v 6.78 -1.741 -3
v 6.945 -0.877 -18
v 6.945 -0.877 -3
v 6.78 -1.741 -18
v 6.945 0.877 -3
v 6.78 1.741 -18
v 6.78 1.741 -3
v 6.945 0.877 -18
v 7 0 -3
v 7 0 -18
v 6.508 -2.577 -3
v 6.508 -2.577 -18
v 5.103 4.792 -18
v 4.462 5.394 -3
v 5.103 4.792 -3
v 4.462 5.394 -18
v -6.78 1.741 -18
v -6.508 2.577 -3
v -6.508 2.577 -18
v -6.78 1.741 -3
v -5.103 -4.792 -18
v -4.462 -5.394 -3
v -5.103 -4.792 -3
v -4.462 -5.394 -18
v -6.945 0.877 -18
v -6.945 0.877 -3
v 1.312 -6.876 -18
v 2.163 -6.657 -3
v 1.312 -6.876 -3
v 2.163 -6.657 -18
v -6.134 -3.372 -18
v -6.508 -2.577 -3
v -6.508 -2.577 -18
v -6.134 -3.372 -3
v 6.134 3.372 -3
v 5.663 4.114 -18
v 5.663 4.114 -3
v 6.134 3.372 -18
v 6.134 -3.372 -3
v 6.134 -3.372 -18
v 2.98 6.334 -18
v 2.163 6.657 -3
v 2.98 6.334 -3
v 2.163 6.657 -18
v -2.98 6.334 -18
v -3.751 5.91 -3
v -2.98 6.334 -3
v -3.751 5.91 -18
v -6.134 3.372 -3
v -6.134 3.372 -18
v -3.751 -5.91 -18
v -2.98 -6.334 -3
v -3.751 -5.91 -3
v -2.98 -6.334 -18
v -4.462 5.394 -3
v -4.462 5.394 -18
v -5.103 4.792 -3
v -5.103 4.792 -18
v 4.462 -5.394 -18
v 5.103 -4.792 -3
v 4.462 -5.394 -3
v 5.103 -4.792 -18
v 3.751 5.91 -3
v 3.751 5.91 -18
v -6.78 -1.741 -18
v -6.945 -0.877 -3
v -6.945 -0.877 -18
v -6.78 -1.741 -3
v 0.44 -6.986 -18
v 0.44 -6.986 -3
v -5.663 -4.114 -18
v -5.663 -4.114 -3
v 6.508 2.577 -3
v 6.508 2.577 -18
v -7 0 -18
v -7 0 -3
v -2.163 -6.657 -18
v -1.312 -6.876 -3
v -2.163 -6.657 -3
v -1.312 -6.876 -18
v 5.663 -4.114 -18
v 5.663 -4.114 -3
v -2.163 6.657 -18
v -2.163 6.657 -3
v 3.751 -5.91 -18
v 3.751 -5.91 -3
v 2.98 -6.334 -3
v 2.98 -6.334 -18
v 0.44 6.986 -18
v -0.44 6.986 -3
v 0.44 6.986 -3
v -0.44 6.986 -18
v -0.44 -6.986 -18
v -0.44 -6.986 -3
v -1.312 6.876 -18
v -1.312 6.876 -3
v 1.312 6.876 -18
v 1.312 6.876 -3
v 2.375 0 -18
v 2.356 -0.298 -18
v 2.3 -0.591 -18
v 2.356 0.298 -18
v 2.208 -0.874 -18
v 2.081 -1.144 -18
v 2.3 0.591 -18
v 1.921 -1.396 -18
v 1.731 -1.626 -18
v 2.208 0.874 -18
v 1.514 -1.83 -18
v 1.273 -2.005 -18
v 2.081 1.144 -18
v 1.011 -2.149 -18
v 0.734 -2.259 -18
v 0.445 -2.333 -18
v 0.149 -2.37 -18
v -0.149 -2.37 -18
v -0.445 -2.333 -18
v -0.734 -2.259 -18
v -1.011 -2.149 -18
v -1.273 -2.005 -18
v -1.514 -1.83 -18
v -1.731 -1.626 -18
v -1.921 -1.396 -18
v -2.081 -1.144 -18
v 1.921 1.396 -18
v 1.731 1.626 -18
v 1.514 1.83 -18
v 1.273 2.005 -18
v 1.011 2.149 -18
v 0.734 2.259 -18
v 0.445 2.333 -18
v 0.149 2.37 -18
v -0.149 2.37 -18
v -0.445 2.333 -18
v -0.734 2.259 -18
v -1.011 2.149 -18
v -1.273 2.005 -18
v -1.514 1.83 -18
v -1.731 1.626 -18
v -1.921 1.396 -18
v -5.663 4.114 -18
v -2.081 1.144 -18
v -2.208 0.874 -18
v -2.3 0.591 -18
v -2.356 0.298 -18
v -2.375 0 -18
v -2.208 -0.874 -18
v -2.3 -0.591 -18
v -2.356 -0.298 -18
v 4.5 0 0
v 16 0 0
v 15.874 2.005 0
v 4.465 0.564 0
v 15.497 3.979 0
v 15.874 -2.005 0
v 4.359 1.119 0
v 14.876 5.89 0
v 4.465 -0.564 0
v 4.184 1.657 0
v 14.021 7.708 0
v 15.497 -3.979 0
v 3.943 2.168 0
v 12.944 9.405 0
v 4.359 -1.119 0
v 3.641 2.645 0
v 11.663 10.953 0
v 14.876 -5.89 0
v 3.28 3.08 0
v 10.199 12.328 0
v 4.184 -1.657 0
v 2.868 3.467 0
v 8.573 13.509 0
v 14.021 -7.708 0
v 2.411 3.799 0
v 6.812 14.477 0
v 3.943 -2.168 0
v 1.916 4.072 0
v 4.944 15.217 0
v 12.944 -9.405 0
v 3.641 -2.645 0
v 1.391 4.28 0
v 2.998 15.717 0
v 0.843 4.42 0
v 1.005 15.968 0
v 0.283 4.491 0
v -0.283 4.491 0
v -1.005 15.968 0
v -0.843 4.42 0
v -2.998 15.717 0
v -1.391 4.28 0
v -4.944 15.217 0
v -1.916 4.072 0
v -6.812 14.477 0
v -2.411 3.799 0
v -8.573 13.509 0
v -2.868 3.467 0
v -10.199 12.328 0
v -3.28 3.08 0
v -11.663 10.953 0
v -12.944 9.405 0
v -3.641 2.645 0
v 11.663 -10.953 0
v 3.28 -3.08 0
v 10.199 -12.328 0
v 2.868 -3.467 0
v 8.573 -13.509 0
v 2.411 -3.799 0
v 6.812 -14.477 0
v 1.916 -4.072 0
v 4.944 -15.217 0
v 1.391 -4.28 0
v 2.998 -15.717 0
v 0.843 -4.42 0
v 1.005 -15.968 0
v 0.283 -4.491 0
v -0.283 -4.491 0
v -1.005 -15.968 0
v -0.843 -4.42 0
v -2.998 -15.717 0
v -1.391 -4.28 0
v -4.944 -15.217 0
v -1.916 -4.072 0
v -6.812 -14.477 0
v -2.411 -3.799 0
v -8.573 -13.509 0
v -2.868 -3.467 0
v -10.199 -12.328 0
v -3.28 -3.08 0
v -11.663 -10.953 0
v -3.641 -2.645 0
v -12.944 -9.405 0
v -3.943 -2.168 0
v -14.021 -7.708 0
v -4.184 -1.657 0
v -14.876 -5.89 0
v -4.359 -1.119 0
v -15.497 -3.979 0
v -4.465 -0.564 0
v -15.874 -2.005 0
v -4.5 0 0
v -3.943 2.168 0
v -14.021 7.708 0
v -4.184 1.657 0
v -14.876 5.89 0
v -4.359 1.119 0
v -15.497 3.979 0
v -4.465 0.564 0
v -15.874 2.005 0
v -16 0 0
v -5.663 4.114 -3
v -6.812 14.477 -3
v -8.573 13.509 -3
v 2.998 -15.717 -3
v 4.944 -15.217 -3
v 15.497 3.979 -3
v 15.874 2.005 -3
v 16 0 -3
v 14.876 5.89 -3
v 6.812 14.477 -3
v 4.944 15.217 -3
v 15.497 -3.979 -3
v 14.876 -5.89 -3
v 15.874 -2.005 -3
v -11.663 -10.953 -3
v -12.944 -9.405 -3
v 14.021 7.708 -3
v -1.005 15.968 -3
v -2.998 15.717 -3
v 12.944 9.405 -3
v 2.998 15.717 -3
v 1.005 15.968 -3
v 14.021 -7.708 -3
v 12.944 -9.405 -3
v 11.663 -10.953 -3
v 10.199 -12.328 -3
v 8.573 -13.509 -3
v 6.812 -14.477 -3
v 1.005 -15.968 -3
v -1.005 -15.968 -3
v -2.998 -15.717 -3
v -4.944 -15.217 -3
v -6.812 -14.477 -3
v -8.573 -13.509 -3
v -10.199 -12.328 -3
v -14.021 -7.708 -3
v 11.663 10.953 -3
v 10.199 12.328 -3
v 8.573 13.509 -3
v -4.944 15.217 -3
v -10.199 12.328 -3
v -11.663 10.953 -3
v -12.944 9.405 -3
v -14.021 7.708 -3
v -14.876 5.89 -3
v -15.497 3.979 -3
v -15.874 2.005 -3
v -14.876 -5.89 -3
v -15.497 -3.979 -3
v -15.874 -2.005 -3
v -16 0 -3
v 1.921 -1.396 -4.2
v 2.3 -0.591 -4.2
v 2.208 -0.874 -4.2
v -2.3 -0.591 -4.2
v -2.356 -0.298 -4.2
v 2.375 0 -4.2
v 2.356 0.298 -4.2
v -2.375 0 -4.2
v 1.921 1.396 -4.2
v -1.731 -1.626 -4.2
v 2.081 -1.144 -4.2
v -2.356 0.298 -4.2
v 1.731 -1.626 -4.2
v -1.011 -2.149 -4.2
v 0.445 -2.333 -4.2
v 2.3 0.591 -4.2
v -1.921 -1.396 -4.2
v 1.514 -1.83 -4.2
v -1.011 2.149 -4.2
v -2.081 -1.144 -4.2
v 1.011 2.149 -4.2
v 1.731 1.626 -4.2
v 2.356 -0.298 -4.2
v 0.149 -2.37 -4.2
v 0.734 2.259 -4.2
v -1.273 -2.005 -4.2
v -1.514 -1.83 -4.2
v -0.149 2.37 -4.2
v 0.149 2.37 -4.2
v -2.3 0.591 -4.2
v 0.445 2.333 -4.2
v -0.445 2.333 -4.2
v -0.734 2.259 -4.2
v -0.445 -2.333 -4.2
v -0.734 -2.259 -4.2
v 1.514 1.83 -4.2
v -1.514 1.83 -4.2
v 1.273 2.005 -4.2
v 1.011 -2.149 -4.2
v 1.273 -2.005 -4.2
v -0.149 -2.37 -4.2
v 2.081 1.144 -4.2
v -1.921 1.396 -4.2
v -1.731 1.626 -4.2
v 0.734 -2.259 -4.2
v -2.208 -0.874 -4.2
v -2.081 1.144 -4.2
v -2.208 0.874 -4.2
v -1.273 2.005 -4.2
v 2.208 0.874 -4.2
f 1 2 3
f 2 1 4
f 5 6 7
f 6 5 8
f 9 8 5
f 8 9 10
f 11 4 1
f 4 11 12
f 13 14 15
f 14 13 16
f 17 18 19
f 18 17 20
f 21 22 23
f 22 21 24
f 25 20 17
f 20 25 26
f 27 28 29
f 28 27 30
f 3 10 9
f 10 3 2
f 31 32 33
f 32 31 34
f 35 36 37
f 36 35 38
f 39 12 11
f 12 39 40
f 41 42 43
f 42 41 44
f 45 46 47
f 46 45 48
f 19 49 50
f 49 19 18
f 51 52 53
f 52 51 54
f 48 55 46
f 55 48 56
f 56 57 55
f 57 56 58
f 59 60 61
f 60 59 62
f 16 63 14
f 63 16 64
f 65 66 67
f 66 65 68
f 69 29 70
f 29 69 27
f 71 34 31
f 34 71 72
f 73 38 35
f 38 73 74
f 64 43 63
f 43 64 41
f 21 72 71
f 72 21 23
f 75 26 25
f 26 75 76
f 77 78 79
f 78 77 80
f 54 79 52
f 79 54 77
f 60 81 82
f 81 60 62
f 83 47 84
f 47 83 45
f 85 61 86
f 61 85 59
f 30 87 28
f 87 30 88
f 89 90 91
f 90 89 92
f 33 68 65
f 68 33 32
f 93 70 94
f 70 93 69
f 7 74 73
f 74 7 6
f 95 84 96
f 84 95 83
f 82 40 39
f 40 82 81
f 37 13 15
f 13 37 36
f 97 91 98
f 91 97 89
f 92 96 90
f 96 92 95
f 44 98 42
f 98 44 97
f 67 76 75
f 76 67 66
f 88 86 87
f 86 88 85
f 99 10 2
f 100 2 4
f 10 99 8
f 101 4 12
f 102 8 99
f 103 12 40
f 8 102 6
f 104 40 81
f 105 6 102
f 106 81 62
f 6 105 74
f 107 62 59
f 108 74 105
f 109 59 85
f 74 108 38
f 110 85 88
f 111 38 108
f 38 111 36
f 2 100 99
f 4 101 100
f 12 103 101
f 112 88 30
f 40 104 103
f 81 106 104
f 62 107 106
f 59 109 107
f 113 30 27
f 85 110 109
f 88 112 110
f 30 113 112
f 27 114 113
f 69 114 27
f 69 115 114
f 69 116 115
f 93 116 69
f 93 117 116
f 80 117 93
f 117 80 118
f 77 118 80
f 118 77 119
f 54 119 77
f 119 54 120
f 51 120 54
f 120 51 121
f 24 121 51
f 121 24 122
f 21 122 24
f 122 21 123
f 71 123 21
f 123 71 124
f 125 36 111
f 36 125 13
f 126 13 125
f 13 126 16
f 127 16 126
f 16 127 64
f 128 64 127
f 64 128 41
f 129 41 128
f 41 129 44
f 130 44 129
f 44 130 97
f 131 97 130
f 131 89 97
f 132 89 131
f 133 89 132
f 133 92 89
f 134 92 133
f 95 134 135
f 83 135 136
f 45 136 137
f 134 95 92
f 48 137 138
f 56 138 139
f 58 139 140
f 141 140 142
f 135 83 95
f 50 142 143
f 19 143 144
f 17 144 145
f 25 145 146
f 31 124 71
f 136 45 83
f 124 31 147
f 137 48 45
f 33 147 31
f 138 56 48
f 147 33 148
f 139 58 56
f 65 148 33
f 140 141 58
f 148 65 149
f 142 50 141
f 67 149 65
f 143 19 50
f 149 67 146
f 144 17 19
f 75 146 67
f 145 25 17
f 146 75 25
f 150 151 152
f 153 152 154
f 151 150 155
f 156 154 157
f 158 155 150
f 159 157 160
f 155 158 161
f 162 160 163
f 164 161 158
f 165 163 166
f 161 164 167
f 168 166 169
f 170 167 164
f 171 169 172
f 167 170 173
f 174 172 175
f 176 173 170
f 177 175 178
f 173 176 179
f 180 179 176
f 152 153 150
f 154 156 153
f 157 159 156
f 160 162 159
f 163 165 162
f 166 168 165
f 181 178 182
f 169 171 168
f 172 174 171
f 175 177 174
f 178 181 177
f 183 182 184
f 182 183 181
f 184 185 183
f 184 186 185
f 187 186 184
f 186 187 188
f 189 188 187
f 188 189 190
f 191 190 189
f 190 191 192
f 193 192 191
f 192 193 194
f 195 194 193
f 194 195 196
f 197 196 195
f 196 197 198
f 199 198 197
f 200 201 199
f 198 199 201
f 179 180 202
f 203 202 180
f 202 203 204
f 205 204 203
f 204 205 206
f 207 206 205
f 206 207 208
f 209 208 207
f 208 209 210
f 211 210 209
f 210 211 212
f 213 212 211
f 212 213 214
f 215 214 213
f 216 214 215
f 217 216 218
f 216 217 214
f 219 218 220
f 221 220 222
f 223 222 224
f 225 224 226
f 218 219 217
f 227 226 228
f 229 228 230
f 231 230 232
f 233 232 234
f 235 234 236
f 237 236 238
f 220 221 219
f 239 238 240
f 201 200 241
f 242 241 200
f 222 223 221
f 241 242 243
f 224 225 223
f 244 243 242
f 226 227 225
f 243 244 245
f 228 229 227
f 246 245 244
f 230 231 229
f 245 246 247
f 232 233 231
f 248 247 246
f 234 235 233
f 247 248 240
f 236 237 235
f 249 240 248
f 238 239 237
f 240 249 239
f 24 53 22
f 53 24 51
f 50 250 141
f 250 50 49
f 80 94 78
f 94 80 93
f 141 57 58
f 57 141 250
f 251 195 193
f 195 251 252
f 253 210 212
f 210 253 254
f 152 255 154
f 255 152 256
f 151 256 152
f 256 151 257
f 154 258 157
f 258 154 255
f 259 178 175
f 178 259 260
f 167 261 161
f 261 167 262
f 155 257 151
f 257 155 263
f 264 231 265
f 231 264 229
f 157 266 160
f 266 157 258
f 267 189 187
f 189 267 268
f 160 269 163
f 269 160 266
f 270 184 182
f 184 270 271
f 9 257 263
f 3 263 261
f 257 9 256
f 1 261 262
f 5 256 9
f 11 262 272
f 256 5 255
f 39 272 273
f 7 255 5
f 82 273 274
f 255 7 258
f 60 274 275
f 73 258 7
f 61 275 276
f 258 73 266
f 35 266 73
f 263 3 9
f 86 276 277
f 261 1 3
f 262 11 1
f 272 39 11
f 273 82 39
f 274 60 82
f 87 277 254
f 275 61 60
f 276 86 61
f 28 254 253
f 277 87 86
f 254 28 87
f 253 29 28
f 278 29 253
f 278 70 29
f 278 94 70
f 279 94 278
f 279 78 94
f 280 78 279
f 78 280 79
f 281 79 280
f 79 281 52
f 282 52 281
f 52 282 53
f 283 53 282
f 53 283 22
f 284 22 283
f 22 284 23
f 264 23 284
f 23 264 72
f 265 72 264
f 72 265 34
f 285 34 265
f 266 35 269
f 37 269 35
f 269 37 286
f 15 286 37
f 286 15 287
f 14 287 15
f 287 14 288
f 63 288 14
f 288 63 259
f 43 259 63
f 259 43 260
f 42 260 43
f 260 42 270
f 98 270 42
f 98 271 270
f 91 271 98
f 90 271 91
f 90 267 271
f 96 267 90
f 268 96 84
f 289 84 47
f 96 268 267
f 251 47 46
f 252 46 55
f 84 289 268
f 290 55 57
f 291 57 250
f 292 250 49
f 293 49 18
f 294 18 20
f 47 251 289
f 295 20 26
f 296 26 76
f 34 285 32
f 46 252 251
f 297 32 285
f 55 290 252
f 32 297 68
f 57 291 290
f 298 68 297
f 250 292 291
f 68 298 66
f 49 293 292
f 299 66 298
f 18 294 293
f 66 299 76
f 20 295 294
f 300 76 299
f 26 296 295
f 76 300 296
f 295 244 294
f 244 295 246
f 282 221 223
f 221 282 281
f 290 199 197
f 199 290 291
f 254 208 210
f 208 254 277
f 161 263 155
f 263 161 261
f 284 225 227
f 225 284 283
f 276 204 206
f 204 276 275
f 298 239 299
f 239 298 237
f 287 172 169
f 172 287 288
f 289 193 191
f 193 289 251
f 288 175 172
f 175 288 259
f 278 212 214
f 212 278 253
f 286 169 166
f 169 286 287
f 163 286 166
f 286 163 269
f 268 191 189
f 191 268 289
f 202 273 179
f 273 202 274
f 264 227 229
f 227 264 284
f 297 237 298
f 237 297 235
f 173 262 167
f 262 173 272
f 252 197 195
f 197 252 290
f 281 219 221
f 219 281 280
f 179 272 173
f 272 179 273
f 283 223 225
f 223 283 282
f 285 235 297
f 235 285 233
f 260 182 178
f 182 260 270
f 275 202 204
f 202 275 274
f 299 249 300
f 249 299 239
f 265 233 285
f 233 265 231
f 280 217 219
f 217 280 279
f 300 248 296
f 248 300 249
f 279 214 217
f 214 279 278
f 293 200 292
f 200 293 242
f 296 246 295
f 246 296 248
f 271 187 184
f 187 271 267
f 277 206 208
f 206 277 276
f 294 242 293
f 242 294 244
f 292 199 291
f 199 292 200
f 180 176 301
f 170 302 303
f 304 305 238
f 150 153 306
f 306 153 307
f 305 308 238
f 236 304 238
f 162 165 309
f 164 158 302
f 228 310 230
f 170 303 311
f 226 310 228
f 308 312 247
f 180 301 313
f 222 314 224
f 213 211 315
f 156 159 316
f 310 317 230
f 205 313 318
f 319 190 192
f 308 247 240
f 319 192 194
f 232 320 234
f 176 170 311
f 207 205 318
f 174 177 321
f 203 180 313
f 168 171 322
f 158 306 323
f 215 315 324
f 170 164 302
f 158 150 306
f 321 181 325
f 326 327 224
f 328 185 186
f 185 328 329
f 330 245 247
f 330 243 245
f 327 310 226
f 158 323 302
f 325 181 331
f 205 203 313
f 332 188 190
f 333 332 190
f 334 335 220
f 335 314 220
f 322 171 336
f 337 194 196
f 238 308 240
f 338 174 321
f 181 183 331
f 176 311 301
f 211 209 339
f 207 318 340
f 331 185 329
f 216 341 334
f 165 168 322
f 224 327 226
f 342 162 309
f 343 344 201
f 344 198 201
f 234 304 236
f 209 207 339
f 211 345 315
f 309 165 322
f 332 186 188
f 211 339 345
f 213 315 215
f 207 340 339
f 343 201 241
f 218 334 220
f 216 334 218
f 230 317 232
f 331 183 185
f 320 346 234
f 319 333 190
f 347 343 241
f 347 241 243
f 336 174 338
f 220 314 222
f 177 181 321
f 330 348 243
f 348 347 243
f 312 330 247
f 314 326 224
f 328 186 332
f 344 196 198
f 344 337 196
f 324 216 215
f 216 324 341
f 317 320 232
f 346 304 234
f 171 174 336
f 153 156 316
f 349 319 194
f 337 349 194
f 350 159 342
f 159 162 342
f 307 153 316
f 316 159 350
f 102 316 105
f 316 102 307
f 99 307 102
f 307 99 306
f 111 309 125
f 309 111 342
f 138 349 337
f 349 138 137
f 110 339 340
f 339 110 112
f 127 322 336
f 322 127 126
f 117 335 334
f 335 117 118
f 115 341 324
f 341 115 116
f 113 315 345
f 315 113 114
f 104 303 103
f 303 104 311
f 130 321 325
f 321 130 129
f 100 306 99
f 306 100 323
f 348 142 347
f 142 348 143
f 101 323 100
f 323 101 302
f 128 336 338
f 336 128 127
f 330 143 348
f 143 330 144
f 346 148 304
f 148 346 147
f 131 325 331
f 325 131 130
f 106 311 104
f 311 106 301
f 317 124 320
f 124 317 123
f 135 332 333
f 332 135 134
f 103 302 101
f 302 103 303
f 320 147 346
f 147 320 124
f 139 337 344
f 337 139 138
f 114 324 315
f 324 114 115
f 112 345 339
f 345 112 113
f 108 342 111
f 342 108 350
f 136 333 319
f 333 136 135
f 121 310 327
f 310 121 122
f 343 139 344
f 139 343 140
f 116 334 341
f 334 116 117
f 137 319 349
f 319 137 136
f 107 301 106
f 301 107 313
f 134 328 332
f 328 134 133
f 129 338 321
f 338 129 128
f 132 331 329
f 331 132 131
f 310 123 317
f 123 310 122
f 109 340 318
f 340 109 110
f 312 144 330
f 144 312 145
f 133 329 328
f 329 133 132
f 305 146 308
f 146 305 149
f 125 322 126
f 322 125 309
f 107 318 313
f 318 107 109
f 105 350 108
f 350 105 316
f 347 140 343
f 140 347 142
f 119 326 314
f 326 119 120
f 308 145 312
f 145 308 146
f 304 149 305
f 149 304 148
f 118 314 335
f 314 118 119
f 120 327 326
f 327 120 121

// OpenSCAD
$fn = 50;


difference() {
	union() {
		translate(v = [0, 0, -18.0000000000]) {
			cylinder(h = 18, r = 7.0000000000);
		}
		translate(v = [0, 0, -3.0000000000]) {
			cylinder(h = 3, r = 16.0000000000);
		}
	}
	union() {
		translate(v = [0, 0, 0]) {
			rotate(a = [0, 0, 0]) {
				difference() {
					union() {
						#translate(v = [0, 0, -18.0000000000]) {
							cylinder(h = 18, r = 2.2500000000);
						}
						#translate(v = [0, 0, -4.2000000000]) {
							cylinder(h = 4.2000000000, r = 7.0000000000, r1 = 2.3750000000, r2 = 4.5000000000);
						}
						#translate(v = [0, 0, -18.0000000000]) {
							cylinder(h = 18, r = 2.3750000000);
						}
						#translate(v = [0, 0, -18.0000000000]) {
							cylinder(h = 18, r = 2.2500000000);
						}
					}
					union();
				}
			}
		}
	}
}
